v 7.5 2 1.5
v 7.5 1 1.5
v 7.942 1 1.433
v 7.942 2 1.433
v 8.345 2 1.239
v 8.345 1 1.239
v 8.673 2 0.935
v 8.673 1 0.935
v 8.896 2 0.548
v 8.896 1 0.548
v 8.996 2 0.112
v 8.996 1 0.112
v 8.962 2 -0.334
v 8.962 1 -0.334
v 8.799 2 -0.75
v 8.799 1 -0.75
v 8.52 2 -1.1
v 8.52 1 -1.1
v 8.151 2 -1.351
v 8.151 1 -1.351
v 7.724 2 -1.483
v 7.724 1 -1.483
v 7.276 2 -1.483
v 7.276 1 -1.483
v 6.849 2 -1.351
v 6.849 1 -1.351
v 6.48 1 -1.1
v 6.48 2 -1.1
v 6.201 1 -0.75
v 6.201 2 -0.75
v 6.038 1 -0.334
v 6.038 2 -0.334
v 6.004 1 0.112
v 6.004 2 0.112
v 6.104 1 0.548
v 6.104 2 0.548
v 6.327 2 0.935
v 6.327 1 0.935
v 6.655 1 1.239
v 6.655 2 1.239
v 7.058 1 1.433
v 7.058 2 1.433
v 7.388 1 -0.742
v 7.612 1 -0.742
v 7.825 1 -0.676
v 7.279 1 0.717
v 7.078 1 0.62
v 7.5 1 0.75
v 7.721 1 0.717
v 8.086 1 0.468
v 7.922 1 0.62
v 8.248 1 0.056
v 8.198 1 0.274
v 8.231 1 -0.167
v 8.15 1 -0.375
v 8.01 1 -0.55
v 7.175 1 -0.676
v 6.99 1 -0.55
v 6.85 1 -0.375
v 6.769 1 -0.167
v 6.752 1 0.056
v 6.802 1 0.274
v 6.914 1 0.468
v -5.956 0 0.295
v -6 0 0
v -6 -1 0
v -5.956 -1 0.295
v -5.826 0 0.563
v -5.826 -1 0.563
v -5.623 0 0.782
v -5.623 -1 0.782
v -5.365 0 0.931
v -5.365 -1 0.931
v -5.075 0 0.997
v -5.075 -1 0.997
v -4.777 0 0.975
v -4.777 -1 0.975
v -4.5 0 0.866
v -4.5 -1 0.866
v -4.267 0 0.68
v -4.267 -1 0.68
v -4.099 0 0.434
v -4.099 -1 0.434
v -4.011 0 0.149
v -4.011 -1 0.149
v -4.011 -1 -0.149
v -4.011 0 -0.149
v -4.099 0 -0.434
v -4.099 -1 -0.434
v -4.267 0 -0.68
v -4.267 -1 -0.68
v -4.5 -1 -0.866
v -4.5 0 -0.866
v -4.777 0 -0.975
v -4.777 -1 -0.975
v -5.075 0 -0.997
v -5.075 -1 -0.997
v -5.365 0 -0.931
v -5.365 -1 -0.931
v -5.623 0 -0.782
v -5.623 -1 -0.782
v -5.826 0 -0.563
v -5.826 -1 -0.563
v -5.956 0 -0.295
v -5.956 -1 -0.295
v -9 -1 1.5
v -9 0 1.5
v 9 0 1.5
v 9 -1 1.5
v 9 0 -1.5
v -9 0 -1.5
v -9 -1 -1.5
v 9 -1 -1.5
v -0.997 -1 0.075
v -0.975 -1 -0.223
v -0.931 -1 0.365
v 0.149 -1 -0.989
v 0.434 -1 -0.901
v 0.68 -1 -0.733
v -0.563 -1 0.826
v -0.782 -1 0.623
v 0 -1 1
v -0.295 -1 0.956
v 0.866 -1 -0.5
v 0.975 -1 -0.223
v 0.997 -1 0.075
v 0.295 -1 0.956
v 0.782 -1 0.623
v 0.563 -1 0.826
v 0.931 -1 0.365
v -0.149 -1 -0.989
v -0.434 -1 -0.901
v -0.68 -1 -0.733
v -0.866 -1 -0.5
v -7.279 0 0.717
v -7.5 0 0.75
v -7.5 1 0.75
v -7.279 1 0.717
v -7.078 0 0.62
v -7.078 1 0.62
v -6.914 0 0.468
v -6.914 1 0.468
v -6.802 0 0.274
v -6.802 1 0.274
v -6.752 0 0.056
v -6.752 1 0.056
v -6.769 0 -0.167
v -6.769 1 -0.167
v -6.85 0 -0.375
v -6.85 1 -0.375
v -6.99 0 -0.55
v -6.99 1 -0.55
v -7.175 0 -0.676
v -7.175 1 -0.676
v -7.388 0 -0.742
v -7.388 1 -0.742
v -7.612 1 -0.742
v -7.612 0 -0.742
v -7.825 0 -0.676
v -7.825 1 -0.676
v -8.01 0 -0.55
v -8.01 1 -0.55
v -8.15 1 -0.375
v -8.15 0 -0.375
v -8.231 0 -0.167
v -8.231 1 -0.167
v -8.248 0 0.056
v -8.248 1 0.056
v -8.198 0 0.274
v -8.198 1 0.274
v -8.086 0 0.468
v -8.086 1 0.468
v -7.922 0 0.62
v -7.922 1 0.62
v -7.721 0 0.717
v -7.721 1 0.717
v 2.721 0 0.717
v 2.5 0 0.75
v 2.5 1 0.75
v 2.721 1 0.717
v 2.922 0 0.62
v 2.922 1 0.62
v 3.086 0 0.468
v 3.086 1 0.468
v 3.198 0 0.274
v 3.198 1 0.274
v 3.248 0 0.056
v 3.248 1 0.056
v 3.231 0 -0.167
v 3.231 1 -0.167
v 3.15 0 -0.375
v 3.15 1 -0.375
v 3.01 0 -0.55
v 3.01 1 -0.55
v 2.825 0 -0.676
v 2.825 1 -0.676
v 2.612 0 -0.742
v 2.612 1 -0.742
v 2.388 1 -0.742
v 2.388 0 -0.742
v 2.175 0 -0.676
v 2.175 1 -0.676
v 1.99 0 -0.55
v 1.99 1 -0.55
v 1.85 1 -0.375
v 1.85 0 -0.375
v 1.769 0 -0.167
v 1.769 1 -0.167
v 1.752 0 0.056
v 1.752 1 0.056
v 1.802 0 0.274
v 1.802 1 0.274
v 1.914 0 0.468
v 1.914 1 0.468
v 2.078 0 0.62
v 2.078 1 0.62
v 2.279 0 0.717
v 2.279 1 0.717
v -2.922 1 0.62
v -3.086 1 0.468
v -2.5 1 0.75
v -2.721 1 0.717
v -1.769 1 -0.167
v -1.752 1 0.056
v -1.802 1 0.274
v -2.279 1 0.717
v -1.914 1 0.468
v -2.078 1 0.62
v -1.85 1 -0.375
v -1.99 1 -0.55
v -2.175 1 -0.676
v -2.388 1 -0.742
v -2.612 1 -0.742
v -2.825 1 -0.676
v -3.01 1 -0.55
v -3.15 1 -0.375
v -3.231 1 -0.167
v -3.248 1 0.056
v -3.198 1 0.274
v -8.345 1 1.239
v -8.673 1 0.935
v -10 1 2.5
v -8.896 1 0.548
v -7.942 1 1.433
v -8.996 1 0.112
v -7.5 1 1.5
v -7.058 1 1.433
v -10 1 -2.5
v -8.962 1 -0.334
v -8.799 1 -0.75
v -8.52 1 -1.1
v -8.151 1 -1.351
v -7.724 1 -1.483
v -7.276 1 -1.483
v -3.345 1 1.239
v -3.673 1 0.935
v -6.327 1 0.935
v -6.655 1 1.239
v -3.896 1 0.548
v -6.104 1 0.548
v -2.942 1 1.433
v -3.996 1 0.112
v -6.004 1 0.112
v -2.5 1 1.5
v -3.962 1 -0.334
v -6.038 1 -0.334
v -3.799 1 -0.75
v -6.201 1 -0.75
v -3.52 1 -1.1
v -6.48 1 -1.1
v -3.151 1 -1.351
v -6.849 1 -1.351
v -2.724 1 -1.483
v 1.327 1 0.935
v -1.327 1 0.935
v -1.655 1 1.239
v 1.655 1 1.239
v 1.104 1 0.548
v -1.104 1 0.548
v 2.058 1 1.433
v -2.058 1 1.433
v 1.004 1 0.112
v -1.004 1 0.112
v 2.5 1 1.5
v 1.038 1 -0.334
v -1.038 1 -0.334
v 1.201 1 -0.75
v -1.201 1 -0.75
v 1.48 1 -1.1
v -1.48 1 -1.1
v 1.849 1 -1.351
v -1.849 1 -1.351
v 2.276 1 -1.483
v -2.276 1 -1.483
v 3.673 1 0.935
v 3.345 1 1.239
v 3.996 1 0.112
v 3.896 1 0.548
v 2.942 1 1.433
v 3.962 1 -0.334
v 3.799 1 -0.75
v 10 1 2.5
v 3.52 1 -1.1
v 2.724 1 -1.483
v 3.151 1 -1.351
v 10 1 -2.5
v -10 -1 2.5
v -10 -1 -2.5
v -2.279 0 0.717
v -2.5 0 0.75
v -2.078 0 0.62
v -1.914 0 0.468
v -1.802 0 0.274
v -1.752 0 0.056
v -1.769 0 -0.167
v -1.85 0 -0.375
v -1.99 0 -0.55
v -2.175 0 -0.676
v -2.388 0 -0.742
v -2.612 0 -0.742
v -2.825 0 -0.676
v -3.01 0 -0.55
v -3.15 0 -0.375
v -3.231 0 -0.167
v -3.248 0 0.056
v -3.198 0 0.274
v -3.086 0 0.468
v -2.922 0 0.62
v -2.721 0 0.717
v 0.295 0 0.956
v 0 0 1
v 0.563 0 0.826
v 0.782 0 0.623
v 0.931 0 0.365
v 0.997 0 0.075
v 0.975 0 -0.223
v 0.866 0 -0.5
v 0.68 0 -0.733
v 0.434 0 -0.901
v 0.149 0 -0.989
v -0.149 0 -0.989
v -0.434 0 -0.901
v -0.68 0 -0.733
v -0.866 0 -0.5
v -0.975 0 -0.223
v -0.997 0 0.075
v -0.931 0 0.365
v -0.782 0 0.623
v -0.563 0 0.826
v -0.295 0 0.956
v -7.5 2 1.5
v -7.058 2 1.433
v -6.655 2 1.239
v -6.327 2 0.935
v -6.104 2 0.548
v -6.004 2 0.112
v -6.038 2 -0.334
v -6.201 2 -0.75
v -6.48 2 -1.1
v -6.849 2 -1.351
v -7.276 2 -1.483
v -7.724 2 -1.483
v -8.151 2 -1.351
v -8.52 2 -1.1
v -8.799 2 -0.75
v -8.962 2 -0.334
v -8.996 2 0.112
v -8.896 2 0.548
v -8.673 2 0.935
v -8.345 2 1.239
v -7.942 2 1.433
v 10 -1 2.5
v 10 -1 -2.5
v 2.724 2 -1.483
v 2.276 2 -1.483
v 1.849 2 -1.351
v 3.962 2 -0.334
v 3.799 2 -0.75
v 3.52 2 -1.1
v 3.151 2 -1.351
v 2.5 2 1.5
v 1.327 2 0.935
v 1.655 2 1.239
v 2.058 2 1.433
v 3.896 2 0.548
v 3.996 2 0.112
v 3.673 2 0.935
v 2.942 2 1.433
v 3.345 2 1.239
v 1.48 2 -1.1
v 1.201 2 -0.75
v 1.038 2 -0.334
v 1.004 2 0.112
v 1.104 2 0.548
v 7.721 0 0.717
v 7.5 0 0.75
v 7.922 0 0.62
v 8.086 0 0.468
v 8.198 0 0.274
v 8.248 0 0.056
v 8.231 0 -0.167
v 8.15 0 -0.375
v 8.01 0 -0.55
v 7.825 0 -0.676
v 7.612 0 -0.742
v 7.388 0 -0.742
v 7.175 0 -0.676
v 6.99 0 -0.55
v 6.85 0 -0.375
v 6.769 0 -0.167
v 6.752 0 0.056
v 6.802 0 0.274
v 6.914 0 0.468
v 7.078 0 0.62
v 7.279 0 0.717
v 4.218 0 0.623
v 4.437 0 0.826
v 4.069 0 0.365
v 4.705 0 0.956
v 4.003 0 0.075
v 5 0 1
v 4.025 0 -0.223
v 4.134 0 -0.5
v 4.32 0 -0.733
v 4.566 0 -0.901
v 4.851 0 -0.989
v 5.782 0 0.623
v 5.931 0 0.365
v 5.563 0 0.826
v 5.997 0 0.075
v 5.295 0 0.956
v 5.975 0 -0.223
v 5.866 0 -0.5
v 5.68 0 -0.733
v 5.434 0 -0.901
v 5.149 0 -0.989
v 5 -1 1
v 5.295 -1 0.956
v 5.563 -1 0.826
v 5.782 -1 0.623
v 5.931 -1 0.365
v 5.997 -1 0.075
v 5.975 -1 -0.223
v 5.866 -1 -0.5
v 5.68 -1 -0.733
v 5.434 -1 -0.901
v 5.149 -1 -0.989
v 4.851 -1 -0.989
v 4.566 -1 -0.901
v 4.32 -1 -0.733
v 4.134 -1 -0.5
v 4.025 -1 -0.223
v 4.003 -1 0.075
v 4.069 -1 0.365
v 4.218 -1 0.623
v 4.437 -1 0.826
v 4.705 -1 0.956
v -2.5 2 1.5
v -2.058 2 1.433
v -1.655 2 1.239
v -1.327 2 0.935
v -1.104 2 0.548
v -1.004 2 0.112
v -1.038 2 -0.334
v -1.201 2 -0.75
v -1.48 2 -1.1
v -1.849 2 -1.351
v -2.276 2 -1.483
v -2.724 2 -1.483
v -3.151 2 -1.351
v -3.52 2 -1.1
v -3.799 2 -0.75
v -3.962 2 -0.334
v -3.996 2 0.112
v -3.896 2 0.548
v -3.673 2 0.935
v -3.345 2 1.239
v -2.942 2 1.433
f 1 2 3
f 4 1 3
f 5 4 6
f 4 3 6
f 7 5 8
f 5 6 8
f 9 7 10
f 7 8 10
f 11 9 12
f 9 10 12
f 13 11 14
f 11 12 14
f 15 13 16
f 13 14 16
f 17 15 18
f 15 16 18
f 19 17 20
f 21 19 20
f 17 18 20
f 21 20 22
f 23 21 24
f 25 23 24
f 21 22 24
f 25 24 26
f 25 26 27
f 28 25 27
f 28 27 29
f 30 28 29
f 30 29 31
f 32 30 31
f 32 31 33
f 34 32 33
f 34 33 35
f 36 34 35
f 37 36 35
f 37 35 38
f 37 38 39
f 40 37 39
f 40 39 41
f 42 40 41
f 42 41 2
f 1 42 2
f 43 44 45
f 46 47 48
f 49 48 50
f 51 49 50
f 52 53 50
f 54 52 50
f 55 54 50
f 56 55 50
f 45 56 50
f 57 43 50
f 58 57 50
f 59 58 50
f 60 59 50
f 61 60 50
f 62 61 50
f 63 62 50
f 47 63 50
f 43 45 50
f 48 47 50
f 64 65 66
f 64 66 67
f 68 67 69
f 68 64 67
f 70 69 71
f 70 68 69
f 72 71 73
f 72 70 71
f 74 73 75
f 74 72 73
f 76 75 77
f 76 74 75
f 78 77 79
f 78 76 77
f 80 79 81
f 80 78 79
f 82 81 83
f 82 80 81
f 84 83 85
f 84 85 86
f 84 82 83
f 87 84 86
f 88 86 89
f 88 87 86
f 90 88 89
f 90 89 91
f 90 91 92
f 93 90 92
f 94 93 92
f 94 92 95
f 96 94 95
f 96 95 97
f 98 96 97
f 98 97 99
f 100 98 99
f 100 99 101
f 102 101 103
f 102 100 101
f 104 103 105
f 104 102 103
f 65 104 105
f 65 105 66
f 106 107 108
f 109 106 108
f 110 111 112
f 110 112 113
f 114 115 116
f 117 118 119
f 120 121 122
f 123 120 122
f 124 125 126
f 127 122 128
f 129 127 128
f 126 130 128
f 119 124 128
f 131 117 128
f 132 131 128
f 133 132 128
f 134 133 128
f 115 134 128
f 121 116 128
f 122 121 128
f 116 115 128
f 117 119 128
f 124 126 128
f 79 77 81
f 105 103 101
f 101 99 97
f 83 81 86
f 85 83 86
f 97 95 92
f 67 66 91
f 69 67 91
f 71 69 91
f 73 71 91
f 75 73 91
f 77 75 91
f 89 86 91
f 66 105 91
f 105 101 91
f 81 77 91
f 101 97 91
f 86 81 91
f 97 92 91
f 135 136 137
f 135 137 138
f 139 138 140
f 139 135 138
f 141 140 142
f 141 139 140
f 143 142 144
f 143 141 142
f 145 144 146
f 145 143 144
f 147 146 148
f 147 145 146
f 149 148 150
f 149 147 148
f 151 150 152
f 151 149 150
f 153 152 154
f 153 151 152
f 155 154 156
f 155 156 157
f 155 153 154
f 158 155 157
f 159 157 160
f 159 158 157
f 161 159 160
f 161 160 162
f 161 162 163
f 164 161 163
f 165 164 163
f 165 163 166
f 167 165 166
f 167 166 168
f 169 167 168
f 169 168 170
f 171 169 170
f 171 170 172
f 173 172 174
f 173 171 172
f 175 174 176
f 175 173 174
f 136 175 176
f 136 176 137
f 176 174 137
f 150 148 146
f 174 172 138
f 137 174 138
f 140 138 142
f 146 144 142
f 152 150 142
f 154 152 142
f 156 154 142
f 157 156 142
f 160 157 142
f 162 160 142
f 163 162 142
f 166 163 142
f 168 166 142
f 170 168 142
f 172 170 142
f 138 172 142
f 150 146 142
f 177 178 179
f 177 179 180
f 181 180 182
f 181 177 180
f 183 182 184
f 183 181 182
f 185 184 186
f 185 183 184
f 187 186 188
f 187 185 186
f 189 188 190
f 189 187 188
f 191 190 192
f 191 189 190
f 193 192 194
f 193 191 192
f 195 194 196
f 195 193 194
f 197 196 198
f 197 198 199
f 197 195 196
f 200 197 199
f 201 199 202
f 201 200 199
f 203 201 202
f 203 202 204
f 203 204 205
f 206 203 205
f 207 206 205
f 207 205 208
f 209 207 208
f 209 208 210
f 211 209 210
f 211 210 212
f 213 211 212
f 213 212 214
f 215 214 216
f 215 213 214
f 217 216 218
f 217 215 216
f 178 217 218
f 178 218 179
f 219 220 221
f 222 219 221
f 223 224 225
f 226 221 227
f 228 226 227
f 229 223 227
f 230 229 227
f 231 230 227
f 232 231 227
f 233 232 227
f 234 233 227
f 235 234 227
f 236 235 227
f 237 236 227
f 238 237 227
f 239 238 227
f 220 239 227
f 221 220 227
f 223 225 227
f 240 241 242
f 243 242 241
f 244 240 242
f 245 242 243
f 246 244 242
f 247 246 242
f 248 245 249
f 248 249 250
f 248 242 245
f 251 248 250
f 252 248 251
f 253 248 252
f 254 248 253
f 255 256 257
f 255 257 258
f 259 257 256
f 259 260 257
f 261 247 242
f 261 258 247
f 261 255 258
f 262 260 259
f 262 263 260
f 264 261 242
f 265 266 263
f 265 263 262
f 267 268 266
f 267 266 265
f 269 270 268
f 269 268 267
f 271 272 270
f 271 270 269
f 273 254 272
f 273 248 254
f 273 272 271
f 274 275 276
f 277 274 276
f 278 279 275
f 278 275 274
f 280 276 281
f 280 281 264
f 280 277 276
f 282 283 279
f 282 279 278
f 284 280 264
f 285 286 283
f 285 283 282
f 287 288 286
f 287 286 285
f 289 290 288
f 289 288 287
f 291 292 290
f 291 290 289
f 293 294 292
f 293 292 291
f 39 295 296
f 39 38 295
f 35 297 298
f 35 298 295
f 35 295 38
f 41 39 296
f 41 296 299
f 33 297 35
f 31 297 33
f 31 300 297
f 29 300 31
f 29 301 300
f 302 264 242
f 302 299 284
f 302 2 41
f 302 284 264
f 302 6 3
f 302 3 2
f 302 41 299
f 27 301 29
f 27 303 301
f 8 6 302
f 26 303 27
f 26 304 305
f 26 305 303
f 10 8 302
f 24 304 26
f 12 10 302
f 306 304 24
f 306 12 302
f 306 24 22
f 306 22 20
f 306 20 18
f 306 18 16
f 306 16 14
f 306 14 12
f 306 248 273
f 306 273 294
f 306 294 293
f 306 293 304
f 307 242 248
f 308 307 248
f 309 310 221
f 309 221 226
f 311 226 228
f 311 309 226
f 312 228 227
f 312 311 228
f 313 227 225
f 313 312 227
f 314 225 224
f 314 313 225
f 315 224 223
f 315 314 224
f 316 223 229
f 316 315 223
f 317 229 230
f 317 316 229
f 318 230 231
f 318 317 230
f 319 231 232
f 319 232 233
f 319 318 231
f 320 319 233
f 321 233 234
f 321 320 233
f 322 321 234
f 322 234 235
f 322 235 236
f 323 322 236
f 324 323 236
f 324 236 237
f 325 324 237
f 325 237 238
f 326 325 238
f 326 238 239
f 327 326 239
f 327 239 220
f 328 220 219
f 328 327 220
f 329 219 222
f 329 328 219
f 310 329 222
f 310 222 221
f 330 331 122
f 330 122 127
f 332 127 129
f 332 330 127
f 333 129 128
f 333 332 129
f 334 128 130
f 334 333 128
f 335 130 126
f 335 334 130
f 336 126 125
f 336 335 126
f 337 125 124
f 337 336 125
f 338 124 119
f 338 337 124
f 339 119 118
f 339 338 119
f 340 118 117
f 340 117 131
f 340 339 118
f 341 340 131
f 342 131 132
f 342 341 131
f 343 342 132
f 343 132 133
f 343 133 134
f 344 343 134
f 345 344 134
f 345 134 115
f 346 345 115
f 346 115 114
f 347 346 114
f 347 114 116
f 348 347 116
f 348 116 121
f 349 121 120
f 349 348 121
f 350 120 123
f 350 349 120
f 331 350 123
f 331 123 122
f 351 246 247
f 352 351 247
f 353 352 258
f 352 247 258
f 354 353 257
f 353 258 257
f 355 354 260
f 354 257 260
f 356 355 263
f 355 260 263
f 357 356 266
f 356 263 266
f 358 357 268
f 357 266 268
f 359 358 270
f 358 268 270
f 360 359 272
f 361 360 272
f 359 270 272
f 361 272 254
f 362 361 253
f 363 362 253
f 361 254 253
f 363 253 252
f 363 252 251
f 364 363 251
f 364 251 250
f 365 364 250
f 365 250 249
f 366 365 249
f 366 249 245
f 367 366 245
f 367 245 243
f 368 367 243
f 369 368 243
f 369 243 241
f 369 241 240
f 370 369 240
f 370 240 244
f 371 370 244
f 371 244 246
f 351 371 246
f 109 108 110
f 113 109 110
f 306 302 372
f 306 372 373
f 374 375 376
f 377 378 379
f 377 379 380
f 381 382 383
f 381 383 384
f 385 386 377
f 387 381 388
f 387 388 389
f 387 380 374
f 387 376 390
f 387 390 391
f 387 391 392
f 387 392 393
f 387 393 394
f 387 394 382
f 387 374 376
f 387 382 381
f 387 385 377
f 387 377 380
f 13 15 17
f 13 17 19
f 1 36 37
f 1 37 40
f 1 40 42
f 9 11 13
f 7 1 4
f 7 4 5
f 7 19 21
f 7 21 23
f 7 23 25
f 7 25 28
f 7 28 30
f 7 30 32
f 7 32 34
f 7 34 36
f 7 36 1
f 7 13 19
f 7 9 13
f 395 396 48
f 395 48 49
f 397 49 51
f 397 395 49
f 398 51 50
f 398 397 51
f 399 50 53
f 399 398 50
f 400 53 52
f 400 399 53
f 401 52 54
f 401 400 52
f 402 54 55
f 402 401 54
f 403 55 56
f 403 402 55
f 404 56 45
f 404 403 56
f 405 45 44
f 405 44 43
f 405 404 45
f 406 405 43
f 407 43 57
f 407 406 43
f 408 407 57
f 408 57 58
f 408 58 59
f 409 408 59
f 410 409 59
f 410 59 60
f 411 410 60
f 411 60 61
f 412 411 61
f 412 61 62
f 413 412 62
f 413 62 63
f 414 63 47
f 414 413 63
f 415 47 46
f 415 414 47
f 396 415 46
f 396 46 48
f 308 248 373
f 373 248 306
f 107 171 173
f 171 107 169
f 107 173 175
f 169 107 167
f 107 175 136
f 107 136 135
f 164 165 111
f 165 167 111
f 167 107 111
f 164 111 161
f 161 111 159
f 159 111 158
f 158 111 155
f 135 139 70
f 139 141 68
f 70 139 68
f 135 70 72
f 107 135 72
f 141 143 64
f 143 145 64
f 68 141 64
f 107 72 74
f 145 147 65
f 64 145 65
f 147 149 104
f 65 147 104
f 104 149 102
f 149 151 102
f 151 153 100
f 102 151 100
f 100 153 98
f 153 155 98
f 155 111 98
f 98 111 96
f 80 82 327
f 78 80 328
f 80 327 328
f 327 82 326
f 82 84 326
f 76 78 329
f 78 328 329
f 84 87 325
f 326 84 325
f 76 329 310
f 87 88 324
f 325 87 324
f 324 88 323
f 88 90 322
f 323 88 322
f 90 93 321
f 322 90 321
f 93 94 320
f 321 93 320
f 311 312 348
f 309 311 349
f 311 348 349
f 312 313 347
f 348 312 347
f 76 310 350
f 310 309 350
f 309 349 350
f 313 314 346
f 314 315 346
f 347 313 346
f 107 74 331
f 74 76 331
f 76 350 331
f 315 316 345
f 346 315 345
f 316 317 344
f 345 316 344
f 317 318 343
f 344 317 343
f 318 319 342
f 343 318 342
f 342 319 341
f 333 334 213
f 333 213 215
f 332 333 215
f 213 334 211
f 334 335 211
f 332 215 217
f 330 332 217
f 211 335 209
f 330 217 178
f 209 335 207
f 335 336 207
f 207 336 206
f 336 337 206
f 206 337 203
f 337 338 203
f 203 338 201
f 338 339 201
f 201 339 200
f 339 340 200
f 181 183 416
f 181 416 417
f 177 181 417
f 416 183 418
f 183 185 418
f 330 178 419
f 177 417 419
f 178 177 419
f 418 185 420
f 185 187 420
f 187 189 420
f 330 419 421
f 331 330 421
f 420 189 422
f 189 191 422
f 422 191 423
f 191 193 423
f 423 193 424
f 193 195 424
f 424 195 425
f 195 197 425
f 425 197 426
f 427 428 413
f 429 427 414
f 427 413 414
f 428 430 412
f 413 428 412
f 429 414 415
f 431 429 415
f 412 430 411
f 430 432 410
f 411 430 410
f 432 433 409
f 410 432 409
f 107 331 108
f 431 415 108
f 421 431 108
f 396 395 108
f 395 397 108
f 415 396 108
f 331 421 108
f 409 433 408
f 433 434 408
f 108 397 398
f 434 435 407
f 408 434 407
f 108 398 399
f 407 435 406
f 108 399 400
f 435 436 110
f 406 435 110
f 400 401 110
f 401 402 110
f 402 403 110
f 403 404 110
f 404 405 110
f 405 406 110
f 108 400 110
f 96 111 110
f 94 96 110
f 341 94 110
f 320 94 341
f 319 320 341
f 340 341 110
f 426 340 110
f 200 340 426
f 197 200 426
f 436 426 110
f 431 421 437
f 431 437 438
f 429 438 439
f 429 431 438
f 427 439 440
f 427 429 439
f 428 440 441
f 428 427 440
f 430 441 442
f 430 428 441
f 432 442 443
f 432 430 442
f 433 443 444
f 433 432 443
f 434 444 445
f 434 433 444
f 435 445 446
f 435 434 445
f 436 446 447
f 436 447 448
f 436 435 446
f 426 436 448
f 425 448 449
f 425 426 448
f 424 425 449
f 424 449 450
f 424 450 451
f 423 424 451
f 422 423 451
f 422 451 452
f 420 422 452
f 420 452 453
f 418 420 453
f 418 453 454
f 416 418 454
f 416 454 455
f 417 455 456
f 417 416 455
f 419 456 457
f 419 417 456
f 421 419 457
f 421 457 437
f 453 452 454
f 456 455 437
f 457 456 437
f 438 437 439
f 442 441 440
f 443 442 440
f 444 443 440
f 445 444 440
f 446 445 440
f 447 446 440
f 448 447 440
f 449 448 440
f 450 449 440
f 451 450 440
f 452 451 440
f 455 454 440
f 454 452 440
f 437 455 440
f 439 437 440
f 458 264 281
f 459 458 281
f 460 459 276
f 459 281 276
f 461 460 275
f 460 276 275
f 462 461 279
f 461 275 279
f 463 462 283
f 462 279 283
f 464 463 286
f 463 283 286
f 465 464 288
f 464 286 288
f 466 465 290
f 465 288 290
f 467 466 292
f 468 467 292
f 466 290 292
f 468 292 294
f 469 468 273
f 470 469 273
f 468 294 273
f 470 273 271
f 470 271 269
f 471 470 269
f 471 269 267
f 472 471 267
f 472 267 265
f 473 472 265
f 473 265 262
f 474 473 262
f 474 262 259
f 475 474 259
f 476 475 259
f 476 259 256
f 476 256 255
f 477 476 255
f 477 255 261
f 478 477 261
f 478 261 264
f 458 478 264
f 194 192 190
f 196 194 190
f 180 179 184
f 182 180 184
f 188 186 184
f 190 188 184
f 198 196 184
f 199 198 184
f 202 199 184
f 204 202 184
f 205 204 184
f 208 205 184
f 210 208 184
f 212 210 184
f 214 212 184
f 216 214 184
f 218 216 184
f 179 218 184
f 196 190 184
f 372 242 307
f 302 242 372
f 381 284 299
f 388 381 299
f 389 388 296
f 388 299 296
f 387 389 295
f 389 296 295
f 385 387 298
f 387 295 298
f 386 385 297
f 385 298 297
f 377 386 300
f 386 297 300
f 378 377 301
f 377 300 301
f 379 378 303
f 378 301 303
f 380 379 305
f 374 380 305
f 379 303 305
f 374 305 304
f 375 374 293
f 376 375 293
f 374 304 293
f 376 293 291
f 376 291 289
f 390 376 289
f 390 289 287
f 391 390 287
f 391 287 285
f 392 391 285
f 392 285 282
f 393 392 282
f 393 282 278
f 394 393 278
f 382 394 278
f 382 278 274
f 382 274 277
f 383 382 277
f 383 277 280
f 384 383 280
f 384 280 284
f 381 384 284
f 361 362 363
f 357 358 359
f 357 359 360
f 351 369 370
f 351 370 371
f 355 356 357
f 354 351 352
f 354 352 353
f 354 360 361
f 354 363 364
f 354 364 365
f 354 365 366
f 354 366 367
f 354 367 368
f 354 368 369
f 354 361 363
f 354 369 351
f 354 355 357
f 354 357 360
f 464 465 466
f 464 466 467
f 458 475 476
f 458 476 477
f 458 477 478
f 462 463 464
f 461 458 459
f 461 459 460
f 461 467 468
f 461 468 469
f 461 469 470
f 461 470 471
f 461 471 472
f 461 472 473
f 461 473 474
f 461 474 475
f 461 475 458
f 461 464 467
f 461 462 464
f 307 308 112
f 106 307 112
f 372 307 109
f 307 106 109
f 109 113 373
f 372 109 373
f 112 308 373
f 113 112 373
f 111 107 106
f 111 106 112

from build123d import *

# Parameters (mm, degrees)
SKETCH1_R             = 1.5
BOSS_EXTRUDE1_DEPTH   = 2
BOSS_EXTRUDE1_2_DEPTH = 2
BOSS_EXTRUDE1_3_DEPTH = 2
BOSS_EXTRUDE1_4_DEPTH = 2
SKETCH1_3_W           = 20
SKETCH1_3_H           = 5
BOSS_EXTRUDE2_DEPTH   = 1
SKETCH1_4_R           = 0.75
CUT_EXTRUDE1_DEPTH    = 1
SKETCH1_5_W           = 20
SKETCH1_5_H           = 5
SKETCH1_5_W_2         = 18
SKETCH1_5_H_2         = 3
SKETCH1_5_R           = 1
BOSS_EXTRUDE3_DEPTH   = 1


with BuildPart() as part:
    # Sketch1 → Boss-Extrude1 (new body)
    with BuildSketch(Plane(origin=(0, 0, 0), x_dir=(1, 0, 0), z_dir=(0, 1, 0))):
        with Locations((-7.5, 0)):
            Circle(SKETCH1_R)
    extrude(amount=BOSS_EXTRUDE1_DEPTH)



with BuildPart() as body_2:
    # Sketch1 → Boss-Extrude1 2 (new body)
    with BuildSketch(Plane(origin=(0, 0, 0), x_dir=(1, 0, 0), z_dir=(0, 1, 0))):
        with Locations((-2.5, 0)):
            Circle(SKETCH1_R)
    extrude(amount=BOSS_EXTRUDE1_2_DEPTH)


with BuildPart() as body_3:
    # Sketch1 → Boss-Extrude1 3 (new body)
    with BuildSketch(Plane(origin=(0, 0, 0), x_dir=(1, 0, 0), z_dir=(0, 1, 0))):
        with Locations((2.5, 0)):
            Circle(SKETCH1_R)
    extrude(amount=BOSS_EXTRUDE1_3_DEPTH)


with BuildPart() as body_4:
    # Sketch1 → Boss-Extrude1 4 (new body)
    with BuildSketch(Plane(origin=(0, 0, 0), x_dir=(1, 0, 0), z_dir=(0, 1, 0))):
        with Locations((7.5, 0)):
            Circle(SKETCH1_R)
    extrude(amount=BOSS_EXTRUDE1_4_DEPTH)


with BuildPart() as part_1:
    add(part.part)

    add(body_2.part)  # Boss-Extrude2 merges body 2

    add(body_3.part)  # Boss-Extrude2 merges body 3

    add(body_4.part)  # Boss-Extrude2 merges body 4
    # Sketch1<3> → Boss-Extrude2 (add)
    with BuildSketch(Plane(origin=(0, 0, 0), x_dir=(1, 0, 0), z_dir=(0, 1, 0))):
        Rectangle(SKETCH1_3_W, SKETCH1_3_H)
    extrude(amount=BOSS_EXTRUDE2_DEPTH)

    # Sketch1<4> → Cut-Extrude1 (cut)
    with BuildSketch(Plane(origin=(0, 0, 0), x_dir=(1, 0, 0), z_dir=(0, 1, 0))):
        with Locations((-7.5, 0)):
            Circle(SKETCH1_4_R)
        with Locations((-2.5, 0)):
            Circle(SKETCH1_4_R)
        with Locations((2.5, 0)):
            Circle(SKETCH1_4_R)
        with Locations((7.5, 0)):
            Circle(SKETCH1_4_R)
    extrude(amount=CUT_EXTRUDE1_DEPTH, mode=Mode.SUBTRACT)

    # Sketch1<5> → Boss-Extrude3 (add)
    # profile 1 of 4: a face of its own
    with BuildSketch(Plane(origin=(0, 0, 0), x_dir=(1, 0, 0), z_dir=(0, 1, 0))):
        Rectangle(SKETCH1_5_W, SKETCH1_5_H)
        Rectangle(SKETCH1_5_W_2, SKETCH1_5_H_2, mode=Mode.SUBTRACT)
    # profile 2 of 4: a face of its own
    with BuildSketch(Plane(origin=(0, 0, 0), x_dir=(1, 0, 0), z_dir=(0, 1, 0))):
        with Locations((5, 0)):
            Circle(SKETCH1_5_R)
    # profile 3 of 4: a face of its own
    with BuildSketch(Plane(origin=(0, 0, 0), x_dir=(1, 0, 0), z_dir=(0, 1, 0))):
        Circle(SKETCH1_5_R)
    # profile 4 of 4: a face of its own
    with BuildSketch(Plane(origin=(0, 0, 0), x_dir=(1, 0, 0), z_dir=(0, 1, 0))):
        with Locations((-5, 0)):
            Circle(SKETCH1_5_R)
    extrude(amount=-BOSS_EXTRUDE3_DEPTH)


solid = part_1.part
